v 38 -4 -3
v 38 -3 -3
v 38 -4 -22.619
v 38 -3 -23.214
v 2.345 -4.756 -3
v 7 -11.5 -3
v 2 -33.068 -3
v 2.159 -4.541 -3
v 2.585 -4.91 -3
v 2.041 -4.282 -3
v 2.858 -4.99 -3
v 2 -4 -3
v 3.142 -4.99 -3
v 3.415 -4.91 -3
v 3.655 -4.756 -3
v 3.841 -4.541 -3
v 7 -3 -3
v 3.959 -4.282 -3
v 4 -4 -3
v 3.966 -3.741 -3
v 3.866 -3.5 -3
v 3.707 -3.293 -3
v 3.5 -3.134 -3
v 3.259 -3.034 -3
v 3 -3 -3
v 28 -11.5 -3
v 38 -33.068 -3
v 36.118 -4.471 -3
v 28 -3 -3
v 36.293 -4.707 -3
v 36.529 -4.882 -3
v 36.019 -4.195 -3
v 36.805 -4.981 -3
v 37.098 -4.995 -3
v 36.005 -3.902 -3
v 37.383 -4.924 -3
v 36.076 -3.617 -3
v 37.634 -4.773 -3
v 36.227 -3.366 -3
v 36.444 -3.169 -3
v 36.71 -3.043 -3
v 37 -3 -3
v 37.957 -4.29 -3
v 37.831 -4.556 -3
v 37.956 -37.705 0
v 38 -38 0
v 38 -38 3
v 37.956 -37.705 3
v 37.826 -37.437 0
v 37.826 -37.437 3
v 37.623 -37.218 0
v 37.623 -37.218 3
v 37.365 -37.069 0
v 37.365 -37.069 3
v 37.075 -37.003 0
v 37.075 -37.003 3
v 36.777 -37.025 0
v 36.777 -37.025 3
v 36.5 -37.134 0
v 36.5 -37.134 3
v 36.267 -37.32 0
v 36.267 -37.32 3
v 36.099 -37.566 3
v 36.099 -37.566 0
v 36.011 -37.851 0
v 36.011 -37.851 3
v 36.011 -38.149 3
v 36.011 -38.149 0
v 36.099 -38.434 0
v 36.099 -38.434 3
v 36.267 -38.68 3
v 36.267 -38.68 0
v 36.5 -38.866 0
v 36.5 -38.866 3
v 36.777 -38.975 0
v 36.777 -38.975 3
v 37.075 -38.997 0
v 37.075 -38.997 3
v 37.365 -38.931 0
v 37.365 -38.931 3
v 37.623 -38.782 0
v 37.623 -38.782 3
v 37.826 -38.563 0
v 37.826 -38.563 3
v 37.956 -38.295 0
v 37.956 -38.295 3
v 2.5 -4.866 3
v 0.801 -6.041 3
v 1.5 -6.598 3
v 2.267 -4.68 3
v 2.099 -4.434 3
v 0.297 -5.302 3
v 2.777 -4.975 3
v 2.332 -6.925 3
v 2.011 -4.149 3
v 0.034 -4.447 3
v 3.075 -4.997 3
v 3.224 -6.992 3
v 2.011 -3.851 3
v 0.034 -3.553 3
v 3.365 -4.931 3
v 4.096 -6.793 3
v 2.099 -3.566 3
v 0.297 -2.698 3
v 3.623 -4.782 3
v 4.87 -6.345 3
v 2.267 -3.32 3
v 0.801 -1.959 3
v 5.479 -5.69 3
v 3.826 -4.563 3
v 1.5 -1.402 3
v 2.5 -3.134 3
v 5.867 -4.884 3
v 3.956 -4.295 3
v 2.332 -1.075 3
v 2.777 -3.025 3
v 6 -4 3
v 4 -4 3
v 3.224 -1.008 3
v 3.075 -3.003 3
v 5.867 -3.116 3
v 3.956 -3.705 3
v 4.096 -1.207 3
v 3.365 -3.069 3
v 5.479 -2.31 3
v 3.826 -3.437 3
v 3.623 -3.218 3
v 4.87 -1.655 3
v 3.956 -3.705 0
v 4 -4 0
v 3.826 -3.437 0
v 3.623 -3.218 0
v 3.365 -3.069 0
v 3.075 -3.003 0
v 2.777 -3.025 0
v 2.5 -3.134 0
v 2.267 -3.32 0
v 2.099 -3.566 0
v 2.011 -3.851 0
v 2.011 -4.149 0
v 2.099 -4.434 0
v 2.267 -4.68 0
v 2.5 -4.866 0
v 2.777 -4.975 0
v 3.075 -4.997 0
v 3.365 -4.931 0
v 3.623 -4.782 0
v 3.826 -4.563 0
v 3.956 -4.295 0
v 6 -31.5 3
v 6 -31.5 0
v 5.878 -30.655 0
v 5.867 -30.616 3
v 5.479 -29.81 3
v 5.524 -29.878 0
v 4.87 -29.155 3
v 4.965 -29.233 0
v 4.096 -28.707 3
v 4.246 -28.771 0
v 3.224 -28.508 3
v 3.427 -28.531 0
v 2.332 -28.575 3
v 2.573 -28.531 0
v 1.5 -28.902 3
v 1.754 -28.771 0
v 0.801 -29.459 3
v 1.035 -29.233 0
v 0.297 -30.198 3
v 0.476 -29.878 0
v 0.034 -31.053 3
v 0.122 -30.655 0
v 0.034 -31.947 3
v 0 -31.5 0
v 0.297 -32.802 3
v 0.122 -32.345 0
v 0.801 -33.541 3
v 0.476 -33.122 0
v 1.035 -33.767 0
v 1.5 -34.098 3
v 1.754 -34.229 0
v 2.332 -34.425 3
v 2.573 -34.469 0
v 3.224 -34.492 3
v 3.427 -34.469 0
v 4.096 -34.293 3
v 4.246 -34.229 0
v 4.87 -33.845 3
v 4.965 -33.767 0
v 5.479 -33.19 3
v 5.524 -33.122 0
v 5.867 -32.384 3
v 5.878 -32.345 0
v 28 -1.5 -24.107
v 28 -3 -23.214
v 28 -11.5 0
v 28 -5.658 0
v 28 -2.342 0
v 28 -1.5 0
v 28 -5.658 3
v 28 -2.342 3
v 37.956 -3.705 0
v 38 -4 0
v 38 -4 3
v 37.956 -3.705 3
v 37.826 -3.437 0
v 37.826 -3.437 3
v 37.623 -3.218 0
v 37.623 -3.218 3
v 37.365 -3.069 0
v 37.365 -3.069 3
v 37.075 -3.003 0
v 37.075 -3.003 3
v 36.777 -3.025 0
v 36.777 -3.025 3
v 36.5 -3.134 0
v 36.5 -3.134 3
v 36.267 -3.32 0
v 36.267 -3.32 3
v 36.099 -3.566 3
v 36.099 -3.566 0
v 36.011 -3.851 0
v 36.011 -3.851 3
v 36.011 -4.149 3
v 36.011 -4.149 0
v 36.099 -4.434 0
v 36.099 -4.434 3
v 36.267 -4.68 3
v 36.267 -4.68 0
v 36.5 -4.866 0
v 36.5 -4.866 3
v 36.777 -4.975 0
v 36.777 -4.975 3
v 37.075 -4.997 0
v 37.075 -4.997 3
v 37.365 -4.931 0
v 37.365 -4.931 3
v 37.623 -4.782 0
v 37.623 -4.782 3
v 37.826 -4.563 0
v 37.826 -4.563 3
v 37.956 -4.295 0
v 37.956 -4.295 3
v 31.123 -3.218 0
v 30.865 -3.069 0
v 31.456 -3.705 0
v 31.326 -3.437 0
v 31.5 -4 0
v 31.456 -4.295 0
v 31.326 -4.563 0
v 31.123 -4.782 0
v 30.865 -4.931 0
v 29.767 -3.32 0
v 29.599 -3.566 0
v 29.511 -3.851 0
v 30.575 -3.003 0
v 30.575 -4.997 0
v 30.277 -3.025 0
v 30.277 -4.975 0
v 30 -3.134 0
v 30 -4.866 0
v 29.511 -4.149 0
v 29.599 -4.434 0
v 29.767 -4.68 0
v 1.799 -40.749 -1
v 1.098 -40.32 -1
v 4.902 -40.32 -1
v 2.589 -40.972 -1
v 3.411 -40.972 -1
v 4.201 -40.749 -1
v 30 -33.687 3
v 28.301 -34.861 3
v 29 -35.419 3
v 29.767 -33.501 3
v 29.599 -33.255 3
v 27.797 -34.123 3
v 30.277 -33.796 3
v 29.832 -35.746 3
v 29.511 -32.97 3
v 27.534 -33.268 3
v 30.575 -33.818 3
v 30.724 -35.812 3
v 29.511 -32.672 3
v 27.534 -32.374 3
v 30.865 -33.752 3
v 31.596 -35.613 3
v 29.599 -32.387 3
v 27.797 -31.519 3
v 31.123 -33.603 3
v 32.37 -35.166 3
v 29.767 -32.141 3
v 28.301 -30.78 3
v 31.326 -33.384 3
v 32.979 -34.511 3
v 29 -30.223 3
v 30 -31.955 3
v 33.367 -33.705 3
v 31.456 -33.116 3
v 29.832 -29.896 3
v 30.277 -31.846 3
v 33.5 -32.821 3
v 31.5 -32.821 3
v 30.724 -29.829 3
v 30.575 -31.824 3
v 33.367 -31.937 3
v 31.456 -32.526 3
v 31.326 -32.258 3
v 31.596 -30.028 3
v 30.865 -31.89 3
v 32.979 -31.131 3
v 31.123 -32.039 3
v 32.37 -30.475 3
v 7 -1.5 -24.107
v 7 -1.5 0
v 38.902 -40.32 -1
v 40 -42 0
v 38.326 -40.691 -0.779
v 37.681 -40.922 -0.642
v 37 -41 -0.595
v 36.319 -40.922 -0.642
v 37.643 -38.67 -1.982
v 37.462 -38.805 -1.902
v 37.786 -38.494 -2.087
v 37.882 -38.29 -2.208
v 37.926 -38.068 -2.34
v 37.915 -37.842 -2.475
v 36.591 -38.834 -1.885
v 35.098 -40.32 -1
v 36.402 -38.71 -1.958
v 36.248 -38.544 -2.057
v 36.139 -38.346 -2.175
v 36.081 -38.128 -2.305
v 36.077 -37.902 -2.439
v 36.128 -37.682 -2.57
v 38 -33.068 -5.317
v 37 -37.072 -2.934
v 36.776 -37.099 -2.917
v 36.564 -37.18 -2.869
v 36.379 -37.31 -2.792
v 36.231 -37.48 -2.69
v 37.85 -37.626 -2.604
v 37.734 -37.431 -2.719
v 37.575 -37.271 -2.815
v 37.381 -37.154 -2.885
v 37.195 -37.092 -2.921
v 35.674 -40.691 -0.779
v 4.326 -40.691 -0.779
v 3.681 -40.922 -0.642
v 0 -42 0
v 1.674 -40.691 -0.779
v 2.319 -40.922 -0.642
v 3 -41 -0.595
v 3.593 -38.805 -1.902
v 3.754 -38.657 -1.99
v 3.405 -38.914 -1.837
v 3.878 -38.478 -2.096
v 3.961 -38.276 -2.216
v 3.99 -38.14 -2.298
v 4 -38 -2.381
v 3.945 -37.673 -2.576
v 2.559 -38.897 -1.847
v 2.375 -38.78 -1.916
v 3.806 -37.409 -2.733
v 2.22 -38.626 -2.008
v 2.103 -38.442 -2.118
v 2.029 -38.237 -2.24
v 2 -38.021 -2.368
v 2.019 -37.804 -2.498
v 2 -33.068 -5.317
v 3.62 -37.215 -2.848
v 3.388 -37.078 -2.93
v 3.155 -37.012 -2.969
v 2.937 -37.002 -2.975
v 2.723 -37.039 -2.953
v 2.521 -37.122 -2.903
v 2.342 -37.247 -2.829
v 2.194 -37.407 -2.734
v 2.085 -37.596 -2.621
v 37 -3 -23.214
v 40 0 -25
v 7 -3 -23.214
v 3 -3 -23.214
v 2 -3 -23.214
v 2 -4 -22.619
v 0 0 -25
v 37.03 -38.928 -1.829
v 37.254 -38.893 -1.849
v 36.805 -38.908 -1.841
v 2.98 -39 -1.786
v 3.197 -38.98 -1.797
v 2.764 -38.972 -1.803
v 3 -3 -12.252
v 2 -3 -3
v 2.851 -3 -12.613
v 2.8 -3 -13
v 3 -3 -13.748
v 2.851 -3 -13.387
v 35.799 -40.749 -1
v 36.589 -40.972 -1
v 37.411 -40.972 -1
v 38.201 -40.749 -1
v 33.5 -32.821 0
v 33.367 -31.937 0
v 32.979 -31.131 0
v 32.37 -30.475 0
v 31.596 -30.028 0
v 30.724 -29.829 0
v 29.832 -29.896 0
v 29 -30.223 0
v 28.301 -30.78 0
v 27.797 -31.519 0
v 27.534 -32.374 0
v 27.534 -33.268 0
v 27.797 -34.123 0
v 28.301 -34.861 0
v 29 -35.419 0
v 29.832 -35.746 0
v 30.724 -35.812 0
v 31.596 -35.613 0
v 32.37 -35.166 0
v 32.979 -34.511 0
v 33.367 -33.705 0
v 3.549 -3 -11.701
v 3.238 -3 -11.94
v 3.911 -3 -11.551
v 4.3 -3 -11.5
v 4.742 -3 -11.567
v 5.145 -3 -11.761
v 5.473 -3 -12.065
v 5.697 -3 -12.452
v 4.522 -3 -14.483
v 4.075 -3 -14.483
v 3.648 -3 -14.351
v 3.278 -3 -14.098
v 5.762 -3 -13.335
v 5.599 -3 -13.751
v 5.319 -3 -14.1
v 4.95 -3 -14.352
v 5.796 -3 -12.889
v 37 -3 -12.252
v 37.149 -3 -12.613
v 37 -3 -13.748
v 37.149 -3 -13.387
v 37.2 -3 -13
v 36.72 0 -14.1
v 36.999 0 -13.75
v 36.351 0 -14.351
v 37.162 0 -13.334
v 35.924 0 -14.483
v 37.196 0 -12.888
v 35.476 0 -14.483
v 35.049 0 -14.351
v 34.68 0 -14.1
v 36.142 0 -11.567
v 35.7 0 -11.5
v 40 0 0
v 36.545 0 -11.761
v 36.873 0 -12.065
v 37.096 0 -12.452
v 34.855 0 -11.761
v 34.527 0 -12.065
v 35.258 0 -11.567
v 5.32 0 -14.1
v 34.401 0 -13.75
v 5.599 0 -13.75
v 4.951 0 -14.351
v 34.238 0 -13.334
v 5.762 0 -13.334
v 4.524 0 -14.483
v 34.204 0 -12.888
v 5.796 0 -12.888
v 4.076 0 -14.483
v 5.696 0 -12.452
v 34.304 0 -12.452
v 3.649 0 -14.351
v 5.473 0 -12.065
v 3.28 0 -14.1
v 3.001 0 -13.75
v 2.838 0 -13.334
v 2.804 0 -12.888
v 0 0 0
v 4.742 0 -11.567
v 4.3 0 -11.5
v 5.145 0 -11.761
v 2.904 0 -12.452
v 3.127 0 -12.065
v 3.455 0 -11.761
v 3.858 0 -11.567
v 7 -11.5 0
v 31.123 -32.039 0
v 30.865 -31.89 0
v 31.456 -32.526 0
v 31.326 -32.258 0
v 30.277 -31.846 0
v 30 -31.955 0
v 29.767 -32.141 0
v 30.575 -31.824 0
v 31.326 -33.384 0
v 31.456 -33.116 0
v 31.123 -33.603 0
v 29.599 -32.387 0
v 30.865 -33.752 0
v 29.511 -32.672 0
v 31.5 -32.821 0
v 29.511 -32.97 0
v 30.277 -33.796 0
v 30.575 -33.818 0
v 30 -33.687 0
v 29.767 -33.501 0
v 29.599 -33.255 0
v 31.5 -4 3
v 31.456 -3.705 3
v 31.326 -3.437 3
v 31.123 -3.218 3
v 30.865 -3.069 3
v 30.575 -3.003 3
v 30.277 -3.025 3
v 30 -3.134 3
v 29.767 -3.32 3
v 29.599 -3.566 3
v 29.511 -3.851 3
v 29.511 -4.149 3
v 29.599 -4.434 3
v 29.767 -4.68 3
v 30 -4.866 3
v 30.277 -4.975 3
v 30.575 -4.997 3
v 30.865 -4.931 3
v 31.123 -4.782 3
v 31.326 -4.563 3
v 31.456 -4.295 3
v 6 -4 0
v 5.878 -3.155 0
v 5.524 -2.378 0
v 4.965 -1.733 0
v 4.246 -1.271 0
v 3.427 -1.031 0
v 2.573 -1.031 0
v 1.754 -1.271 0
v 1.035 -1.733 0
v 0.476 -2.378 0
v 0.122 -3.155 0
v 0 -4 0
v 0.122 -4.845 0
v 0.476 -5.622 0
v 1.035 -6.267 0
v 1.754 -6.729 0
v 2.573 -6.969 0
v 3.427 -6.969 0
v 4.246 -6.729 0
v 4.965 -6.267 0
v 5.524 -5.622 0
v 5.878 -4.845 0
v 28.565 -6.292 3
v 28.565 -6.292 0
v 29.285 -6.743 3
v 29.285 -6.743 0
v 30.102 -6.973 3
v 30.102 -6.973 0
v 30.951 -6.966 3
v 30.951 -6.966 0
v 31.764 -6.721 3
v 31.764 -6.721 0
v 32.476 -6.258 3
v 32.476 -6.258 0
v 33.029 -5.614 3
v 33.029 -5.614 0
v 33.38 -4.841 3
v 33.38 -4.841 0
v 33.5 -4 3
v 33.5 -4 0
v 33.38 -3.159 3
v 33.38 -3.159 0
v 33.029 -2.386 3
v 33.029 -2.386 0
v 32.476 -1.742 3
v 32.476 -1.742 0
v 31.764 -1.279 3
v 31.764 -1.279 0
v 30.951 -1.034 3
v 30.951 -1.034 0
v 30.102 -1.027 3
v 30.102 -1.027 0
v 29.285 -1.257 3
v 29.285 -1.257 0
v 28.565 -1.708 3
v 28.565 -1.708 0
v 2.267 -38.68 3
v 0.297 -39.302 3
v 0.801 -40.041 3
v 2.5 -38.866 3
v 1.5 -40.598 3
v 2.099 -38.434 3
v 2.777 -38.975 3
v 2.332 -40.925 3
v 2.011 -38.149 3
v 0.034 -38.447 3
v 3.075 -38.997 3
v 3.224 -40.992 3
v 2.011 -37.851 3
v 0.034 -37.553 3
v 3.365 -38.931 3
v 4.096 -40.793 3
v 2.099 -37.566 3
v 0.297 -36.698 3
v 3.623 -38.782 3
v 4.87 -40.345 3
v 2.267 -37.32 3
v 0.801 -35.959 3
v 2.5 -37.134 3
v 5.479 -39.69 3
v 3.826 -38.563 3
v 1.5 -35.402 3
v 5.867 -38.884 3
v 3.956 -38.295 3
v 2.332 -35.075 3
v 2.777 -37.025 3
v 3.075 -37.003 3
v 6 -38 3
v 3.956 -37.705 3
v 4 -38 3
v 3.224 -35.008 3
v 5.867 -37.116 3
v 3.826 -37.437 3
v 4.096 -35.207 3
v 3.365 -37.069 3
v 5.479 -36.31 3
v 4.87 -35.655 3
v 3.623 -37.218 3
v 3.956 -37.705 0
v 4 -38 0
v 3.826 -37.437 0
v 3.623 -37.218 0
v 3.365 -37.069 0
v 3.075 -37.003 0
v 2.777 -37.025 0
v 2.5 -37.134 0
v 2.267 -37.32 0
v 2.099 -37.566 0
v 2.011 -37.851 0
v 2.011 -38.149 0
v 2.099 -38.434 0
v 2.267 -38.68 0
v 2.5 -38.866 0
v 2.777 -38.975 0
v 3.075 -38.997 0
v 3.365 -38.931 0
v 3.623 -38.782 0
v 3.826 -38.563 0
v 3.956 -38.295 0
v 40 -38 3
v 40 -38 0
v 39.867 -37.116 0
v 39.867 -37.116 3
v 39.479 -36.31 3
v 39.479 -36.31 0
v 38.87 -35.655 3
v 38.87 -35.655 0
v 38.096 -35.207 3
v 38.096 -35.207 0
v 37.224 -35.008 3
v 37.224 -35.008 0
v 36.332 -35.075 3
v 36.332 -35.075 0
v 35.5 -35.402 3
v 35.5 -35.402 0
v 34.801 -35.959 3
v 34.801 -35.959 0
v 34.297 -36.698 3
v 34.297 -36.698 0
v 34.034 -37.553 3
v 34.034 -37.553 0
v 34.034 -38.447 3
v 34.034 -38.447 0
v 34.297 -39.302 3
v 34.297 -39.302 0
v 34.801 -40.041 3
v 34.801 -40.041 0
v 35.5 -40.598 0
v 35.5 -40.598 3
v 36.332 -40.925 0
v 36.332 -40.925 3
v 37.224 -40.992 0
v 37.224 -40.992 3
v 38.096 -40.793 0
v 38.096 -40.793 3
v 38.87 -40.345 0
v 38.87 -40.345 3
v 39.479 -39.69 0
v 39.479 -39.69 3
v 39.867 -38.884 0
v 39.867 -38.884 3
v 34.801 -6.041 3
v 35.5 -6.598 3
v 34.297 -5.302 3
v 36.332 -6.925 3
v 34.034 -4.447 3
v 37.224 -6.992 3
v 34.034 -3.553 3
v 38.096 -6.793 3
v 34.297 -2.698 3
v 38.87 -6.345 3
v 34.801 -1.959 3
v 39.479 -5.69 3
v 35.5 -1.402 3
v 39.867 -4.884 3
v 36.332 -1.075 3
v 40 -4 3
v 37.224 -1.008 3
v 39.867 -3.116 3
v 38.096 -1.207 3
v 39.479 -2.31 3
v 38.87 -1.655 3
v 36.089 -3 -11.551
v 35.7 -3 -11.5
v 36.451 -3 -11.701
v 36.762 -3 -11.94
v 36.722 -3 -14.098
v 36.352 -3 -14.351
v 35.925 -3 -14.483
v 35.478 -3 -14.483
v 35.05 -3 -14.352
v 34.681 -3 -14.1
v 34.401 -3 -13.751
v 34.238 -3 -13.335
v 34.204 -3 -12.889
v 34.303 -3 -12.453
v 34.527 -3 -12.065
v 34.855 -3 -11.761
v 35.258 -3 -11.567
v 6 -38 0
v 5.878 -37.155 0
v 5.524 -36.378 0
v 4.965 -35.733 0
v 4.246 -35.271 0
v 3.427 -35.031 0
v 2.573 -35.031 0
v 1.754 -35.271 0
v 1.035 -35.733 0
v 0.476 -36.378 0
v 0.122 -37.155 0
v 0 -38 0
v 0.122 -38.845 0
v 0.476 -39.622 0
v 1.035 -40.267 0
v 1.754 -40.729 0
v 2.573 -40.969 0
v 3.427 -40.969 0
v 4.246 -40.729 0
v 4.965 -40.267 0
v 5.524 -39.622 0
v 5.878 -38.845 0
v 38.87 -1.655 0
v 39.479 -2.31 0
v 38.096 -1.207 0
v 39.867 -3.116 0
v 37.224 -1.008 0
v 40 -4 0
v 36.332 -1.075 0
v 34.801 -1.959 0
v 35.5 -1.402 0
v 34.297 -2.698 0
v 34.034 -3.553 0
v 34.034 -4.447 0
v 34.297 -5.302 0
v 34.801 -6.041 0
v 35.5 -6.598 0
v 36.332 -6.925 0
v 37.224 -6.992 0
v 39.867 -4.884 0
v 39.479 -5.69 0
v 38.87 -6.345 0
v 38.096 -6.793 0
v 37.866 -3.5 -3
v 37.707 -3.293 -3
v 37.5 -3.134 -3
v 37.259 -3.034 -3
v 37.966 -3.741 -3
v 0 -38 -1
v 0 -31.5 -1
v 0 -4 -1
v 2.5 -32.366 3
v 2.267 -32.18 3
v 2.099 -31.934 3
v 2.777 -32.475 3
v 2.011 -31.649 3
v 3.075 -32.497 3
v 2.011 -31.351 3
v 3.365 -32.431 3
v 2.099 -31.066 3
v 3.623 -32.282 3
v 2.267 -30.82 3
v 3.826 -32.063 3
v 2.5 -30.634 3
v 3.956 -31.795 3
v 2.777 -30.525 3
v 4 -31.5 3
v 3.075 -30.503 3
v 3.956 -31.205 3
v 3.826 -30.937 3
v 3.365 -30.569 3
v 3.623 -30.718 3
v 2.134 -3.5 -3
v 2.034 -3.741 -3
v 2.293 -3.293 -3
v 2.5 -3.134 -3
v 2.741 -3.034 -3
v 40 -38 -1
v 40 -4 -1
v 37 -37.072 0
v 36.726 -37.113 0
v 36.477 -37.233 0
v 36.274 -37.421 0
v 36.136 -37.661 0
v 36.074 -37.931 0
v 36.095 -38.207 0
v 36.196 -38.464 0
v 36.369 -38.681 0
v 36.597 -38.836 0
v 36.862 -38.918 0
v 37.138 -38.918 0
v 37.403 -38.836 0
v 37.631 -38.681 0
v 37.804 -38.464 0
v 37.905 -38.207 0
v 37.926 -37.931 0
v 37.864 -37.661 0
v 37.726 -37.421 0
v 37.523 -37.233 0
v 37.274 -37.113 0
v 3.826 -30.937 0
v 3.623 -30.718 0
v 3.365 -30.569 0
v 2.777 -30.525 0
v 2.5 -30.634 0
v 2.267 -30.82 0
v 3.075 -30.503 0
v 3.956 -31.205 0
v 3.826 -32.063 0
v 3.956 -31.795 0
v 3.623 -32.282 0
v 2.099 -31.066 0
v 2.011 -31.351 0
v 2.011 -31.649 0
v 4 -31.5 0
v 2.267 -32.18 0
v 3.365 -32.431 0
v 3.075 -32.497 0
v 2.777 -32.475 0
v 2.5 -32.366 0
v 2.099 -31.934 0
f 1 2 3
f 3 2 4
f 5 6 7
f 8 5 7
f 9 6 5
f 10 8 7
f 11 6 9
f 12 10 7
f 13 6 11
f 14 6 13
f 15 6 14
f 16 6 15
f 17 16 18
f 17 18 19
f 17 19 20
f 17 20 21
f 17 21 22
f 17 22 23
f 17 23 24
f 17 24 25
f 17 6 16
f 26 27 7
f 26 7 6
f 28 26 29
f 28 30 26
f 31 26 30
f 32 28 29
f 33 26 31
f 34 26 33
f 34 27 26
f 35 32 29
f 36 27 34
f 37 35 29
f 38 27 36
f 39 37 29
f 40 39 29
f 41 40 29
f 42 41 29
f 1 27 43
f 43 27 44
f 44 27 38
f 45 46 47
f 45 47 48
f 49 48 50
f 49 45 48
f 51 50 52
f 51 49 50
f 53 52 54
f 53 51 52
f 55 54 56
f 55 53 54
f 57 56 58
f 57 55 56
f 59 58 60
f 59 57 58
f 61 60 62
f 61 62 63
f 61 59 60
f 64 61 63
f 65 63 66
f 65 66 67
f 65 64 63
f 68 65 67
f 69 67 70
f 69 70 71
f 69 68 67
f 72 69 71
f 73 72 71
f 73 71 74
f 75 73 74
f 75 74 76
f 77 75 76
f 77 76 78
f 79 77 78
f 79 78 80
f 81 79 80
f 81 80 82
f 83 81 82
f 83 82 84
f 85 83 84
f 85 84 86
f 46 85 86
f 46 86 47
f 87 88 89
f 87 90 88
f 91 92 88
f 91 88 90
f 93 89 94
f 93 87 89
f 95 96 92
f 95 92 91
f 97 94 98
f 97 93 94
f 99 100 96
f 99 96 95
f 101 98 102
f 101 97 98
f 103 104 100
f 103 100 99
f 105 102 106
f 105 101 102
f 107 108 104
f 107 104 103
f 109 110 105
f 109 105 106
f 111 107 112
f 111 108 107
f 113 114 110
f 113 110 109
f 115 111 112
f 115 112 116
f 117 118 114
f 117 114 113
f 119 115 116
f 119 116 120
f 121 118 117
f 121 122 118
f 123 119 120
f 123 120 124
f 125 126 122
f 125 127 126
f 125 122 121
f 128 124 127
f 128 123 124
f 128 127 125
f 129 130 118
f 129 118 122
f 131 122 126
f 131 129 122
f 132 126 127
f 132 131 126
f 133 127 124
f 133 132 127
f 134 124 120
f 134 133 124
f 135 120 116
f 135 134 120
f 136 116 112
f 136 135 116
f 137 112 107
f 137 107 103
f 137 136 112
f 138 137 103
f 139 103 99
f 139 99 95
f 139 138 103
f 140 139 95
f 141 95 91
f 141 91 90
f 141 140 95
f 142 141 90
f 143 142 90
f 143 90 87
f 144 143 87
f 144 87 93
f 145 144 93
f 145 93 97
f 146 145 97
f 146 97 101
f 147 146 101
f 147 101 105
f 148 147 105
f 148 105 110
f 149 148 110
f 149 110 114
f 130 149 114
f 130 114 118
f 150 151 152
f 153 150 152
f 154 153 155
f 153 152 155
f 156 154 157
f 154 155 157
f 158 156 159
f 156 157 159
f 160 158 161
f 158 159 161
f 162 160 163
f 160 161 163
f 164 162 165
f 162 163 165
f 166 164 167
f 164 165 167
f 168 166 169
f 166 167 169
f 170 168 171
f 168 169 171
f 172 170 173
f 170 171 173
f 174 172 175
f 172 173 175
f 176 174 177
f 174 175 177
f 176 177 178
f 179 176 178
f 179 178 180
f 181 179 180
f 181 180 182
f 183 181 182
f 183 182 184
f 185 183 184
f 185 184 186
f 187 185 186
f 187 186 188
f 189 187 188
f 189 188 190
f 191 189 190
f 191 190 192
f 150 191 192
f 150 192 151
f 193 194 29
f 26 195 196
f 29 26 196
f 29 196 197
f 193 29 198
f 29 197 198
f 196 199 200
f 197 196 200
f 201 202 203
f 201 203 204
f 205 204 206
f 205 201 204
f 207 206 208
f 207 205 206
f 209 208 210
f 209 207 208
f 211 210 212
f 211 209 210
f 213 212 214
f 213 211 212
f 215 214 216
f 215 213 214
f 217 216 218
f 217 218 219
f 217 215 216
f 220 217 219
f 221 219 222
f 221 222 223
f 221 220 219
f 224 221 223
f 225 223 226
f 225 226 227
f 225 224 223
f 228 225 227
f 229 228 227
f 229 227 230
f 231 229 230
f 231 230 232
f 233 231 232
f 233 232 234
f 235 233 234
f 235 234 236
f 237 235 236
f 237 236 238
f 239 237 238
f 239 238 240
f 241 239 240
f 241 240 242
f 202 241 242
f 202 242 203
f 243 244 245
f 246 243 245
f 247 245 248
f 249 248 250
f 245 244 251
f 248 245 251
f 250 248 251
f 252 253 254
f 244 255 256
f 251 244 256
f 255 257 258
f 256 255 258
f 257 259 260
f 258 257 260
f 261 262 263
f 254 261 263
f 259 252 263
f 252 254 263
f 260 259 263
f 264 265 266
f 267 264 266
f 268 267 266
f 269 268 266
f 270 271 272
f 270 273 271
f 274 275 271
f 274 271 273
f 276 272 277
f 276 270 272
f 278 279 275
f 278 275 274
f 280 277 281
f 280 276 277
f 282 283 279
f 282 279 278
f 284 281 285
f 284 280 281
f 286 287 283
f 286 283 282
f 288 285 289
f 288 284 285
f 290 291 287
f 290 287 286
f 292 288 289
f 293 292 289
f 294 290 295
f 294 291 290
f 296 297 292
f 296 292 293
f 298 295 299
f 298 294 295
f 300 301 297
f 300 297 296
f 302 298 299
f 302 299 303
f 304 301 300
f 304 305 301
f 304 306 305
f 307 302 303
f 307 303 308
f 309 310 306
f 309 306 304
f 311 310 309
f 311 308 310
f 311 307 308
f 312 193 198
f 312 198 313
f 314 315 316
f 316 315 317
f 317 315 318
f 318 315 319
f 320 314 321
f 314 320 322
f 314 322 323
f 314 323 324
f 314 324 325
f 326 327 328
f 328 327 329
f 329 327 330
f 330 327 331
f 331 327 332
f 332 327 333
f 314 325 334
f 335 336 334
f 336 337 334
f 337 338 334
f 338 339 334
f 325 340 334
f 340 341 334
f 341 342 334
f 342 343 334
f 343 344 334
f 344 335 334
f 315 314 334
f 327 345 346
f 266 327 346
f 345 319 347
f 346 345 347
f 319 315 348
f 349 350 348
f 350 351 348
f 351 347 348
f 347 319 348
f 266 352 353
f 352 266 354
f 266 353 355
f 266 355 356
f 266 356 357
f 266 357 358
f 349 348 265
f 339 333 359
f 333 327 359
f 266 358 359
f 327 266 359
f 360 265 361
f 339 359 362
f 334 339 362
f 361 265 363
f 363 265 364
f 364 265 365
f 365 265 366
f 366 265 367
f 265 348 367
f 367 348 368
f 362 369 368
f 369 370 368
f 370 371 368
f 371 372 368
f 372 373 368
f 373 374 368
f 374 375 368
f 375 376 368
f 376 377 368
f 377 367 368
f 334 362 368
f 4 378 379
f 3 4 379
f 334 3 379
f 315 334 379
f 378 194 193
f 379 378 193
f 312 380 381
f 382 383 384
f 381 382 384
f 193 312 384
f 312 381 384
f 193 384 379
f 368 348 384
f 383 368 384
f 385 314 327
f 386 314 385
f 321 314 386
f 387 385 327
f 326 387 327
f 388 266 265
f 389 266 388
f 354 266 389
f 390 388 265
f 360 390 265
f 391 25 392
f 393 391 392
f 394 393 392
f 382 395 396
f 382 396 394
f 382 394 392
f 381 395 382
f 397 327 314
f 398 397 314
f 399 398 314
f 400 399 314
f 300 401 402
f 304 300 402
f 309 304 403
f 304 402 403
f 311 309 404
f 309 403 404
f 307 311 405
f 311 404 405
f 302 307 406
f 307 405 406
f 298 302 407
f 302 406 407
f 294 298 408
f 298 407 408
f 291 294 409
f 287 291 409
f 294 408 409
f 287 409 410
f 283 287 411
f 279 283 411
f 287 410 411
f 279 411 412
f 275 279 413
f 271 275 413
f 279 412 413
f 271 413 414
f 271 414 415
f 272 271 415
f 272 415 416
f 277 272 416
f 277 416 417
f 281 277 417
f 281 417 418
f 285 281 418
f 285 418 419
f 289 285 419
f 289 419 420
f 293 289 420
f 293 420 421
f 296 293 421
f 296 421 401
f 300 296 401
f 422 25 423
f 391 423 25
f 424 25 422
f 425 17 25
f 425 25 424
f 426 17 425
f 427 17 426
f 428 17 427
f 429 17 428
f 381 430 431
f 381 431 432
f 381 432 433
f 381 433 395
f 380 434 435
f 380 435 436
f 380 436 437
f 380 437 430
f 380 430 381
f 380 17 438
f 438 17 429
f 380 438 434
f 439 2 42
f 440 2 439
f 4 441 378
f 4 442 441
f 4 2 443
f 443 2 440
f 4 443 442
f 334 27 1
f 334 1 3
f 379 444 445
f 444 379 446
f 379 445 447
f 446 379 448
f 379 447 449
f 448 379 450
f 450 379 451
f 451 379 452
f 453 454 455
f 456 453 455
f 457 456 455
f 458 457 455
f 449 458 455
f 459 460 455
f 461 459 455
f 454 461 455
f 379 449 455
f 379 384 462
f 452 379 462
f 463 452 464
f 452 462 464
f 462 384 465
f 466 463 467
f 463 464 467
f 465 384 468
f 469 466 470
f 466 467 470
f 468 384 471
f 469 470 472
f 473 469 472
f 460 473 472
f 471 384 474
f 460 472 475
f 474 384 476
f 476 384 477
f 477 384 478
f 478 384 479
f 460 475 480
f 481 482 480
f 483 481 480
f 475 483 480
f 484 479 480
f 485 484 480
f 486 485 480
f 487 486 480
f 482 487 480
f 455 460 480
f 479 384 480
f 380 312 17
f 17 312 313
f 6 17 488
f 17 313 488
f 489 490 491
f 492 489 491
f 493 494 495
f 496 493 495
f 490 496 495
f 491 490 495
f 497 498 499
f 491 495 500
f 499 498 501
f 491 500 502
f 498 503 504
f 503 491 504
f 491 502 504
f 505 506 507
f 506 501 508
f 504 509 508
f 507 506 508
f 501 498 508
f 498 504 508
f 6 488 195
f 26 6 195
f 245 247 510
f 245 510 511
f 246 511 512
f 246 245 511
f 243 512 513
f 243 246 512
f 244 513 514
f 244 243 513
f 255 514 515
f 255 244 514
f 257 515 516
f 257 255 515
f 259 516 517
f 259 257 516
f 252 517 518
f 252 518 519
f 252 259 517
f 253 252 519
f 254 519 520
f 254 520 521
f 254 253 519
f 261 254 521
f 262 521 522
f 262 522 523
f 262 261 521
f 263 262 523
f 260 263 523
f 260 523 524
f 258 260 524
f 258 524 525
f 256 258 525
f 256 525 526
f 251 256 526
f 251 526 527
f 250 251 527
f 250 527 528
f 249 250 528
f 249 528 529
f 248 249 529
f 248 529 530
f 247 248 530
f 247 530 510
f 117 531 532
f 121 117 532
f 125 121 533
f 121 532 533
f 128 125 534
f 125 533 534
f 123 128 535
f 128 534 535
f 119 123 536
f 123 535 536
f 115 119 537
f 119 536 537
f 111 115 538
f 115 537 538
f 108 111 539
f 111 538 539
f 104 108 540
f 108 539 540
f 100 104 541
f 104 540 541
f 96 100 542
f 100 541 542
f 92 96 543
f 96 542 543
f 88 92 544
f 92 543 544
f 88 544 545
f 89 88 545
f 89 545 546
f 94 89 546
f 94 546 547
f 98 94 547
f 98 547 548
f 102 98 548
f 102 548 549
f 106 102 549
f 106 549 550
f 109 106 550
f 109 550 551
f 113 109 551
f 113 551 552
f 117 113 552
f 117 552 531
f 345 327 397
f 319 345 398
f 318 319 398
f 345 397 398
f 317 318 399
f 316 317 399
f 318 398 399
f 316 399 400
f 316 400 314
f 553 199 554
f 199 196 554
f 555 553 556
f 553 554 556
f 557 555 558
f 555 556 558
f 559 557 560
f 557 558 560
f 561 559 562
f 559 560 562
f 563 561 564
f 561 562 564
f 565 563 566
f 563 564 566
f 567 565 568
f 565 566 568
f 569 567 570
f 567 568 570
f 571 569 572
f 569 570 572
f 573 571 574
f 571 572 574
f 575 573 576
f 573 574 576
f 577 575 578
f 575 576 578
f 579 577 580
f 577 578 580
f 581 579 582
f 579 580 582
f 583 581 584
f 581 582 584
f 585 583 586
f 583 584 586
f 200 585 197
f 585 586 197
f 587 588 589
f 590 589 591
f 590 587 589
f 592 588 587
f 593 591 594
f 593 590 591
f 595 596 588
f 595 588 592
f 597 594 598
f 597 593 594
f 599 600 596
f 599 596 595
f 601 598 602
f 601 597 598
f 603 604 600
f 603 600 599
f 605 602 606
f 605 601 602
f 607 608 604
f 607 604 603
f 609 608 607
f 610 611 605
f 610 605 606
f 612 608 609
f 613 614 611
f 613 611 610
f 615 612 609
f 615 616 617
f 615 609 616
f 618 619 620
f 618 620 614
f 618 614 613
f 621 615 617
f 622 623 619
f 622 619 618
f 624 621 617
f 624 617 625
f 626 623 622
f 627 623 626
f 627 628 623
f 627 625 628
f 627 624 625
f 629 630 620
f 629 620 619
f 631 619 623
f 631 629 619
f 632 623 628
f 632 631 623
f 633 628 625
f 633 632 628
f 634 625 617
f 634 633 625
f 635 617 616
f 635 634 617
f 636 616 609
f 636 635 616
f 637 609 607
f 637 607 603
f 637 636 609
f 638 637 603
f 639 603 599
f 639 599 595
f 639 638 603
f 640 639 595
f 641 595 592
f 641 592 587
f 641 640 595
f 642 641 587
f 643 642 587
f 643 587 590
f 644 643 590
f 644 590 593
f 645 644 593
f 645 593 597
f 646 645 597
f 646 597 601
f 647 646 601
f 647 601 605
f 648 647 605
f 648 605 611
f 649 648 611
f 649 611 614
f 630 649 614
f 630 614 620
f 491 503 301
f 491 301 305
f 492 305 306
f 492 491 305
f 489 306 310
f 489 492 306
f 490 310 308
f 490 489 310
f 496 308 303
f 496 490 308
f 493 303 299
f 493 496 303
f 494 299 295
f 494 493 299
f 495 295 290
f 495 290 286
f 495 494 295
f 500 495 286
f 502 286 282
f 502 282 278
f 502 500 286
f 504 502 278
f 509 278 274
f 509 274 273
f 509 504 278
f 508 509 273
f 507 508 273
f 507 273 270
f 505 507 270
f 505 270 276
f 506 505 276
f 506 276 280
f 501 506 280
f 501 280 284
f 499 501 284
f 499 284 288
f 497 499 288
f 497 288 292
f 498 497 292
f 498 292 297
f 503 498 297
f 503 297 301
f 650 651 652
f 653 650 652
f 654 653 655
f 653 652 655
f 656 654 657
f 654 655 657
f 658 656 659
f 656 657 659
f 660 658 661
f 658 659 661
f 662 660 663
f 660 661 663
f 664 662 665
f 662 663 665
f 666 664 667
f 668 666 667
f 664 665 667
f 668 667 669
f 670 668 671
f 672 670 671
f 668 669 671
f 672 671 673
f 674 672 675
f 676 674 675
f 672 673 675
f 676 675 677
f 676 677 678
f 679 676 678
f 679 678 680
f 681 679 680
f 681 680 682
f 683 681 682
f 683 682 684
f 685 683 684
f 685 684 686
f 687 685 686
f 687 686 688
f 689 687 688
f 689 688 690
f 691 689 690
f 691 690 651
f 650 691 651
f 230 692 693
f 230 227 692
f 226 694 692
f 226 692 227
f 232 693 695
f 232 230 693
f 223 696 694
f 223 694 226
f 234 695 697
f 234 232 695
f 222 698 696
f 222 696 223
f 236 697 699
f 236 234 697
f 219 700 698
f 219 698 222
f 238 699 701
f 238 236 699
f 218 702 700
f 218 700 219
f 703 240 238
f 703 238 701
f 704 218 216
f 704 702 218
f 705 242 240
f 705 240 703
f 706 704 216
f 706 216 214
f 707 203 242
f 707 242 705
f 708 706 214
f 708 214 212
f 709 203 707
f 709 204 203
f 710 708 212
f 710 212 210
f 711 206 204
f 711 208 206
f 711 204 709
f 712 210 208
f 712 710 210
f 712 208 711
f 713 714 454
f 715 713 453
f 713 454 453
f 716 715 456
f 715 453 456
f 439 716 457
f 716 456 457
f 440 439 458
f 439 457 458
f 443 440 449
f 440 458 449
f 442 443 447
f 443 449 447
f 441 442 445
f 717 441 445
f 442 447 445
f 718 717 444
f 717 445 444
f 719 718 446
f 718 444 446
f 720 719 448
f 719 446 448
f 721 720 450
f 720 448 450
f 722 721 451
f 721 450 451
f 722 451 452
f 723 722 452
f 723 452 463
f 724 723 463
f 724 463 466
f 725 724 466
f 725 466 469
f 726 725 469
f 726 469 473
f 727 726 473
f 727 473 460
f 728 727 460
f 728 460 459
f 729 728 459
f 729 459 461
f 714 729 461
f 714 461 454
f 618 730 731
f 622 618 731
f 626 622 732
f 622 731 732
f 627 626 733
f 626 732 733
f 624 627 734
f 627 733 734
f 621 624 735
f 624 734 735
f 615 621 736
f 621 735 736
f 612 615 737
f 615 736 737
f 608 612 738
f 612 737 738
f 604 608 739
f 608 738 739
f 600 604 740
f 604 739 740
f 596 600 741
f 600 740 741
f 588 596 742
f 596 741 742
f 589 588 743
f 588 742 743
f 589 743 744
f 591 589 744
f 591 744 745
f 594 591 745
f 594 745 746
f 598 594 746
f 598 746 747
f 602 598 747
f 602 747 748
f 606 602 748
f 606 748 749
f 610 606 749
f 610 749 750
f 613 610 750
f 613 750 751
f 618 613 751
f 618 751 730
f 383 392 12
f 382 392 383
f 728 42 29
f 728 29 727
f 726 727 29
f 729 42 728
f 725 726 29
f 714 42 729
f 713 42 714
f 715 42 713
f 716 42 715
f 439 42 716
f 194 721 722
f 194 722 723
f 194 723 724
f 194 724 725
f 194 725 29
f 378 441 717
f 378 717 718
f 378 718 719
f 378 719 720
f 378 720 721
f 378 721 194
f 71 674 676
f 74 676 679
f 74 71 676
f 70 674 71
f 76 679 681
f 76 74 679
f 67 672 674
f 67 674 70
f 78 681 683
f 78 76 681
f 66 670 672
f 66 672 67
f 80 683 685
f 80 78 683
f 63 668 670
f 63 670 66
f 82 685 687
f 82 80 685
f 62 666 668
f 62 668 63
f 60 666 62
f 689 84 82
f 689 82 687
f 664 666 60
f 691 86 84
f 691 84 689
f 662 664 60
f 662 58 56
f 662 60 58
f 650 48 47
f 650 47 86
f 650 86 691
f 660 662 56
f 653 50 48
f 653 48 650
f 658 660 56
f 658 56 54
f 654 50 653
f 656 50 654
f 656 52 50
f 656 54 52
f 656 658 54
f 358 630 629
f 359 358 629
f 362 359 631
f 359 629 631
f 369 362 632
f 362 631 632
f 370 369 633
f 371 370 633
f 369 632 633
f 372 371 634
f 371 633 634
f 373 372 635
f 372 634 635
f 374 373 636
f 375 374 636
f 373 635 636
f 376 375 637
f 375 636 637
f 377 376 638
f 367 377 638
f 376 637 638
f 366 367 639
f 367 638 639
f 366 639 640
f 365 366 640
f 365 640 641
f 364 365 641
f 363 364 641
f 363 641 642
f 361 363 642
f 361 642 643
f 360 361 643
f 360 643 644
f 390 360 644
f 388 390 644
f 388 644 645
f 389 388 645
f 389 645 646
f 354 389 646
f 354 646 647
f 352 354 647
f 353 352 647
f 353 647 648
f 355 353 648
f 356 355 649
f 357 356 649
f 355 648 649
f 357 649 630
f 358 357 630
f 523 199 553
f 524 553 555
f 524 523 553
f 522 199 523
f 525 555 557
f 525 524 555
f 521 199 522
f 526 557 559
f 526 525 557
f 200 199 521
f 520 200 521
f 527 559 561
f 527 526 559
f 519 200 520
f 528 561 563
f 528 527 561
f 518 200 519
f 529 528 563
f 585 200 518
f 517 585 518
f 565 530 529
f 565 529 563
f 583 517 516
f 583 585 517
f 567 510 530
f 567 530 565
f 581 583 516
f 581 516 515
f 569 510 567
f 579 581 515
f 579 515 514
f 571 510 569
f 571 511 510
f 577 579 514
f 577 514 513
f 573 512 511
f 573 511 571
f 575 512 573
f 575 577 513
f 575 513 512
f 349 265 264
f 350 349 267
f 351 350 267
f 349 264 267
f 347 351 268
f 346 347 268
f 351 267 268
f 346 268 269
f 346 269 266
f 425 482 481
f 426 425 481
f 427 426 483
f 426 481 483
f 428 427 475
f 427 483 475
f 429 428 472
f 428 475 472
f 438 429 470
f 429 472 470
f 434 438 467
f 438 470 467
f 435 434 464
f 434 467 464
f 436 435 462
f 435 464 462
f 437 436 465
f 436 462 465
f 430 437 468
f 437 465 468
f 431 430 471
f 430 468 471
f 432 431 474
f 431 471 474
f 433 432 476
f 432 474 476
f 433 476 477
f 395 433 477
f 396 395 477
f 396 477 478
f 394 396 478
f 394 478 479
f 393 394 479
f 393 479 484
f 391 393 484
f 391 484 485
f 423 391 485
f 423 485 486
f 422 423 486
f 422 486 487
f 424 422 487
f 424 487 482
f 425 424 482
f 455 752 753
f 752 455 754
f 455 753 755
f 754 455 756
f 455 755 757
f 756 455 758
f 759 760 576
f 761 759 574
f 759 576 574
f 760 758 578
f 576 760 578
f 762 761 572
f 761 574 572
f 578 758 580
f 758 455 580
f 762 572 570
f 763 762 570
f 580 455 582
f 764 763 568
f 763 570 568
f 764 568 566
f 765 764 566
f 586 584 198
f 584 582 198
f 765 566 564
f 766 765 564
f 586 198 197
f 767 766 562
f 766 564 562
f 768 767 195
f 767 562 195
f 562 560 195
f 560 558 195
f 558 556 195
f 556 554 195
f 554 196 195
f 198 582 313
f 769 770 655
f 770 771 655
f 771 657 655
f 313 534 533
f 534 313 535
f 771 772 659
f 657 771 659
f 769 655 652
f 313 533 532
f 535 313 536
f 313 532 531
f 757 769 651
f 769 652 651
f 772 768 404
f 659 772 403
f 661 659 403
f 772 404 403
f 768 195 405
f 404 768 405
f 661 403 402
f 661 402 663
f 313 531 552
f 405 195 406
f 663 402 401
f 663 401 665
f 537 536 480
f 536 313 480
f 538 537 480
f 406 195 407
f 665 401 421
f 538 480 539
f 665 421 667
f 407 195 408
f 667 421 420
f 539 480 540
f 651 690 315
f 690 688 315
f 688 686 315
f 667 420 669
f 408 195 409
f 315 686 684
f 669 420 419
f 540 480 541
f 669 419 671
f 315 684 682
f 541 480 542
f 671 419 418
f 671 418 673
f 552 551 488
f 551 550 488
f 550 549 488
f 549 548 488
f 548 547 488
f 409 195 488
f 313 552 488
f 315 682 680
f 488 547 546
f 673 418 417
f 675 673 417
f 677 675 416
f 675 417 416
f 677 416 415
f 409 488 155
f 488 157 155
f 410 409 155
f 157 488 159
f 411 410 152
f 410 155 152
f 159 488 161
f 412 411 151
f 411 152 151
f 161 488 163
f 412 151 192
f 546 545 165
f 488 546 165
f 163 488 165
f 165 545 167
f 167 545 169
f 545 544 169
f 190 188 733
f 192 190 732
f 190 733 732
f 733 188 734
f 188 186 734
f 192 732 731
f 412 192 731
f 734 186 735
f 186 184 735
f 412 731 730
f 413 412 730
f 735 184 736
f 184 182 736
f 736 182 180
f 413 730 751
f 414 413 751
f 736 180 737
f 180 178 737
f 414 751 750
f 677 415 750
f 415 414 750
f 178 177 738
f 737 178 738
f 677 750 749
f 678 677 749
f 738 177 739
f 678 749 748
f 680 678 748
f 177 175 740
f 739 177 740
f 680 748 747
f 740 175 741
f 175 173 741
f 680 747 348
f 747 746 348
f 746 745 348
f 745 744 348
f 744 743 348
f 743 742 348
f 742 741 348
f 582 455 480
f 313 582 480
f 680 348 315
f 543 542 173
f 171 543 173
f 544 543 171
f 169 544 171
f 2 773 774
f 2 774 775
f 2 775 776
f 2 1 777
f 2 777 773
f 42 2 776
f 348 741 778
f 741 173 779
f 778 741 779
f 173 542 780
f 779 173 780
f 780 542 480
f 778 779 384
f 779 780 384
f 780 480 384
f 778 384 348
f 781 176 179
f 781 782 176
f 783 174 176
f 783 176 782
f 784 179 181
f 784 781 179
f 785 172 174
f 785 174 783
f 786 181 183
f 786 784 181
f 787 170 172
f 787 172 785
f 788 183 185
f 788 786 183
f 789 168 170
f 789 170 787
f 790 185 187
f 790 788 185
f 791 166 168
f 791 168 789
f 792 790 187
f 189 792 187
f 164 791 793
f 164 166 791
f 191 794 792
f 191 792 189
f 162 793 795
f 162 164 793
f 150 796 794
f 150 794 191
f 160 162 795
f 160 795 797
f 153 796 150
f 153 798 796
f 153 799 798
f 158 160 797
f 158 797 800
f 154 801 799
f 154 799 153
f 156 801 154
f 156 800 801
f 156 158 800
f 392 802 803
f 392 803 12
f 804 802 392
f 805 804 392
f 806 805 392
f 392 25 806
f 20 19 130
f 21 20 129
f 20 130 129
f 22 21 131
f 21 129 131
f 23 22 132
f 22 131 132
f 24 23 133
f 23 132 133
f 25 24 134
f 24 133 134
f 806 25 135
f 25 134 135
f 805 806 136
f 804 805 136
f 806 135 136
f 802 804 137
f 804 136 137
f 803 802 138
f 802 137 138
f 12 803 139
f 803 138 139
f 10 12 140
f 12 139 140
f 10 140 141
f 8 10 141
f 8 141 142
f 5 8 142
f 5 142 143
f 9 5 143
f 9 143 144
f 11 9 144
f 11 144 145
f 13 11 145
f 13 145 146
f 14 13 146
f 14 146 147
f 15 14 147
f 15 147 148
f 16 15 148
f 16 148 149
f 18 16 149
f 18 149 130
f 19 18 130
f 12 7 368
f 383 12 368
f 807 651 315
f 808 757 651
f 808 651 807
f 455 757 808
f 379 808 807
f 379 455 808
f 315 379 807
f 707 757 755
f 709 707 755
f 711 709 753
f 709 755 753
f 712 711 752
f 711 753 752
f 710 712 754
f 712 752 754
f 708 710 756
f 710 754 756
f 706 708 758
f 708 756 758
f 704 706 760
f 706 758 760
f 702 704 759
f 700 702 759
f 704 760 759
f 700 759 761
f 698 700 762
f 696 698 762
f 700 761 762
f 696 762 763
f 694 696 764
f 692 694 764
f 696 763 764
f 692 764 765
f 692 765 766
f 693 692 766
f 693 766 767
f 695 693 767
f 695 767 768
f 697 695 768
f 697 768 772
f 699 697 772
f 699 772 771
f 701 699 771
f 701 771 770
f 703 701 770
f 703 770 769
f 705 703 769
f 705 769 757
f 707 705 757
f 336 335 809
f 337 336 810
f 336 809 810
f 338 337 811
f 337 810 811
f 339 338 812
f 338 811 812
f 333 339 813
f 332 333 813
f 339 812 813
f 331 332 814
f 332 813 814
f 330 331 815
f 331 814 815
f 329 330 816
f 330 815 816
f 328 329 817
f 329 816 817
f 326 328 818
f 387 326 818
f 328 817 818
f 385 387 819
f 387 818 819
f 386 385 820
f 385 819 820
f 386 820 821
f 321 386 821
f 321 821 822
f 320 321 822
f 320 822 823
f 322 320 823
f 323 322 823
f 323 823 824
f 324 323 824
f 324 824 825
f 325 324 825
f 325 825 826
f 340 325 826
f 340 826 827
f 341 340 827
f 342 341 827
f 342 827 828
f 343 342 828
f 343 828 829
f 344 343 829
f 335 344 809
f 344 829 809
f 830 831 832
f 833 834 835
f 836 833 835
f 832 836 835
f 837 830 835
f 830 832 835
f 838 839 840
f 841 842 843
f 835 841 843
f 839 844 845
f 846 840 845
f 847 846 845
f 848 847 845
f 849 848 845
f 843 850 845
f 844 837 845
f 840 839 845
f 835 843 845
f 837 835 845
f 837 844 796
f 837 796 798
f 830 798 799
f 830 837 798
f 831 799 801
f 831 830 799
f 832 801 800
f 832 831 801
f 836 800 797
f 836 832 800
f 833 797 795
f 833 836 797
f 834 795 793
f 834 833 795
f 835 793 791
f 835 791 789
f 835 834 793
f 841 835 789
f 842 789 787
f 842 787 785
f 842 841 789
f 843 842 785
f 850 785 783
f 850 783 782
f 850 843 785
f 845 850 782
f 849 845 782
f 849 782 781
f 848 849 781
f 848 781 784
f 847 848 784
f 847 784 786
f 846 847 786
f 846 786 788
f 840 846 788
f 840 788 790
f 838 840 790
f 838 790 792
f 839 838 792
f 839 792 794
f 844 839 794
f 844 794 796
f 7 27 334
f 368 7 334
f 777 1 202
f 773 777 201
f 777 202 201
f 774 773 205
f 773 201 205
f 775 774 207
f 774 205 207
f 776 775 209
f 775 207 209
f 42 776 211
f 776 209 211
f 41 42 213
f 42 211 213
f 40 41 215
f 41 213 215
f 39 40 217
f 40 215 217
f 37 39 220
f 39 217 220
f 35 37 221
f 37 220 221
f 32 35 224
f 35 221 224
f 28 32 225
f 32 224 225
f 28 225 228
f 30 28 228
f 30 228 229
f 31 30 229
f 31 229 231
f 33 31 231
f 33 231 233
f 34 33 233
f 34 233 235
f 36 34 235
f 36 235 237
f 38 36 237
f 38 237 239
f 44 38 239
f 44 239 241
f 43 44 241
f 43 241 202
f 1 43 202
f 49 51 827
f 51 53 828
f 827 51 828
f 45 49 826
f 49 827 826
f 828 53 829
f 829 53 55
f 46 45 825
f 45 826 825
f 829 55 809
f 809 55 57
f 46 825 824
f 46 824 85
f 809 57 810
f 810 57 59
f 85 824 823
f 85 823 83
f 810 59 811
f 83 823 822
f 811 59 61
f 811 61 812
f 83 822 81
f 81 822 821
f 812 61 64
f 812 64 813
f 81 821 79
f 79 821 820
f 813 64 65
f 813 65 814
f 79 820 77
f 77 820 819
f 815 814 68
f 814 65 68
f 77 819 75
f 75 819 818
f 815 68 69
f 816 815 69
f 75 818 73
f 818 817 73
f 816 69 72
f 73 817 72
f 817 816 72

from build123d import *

# Parameters (mm, degrees)
EXTRUDE_1_DEPTH      = 40
SKETCH_2_W           = 20.831357784
SKETCH_2_H           = 30.068143155
CUT_EXTRUDE_1_DEPTH  = 36
SKETCH_3_R           = 1.5
CUT_EXTRUDE_2_DEPTH  = 32
EXTRUDE_2_DEPTH      = 3
EXTRUDE_2_DEPTH_BACK = 1
SKETCH_4_R           = 3
SKETCH_4_R_2         = 1
SKETCH_5_R           = 1
SKETCH_5_R_2         = 0.928338532
CUT_EXTRUDE_3_DEPTH  = 65.404968752


with BuildPart() as part:
    # 草图1 → 凸台-拉伸1 (new body)
    with BuildSketch(Plane(origin=(0, 0, 0), x_dir=(0, 0, -1), z_dir=(1, 0, 0))):
        Polygon((0, 0), (0, -42), (25, 0), align=None)
    extrude(amount=EXTRUDE_1_DEPTH)

    # 草图2 → 切除-拉伸1 (cut)
    with BuildSketch(Plane(origin=(38, 0, 0), x_dir=(0, 0, -1), z_dir=(1, 0, 0))):
        with Locations((13.415678892, -18.034071578)):
            Rectangle(SKETCH_2_W, SKETCH_2_H)
    extrude(amount=-CUT_EXTRUDE_1_DEPTH, mode=Mode.SUBTRACT)

    # 草图3 → 切除-拉伸2 (cut)
    with BuildSketch(Plane(origin=(0, 0, 0), x_dir=(1, 0, 0), z_dir=(0, 1, 0))):
        with Locations(Location((4.3, 13, 0), (0, 0, 270))):
            Circle(SKETCH_3_R)
        with Locations(Location((35.7, 13, 0), (0, 0, 270))):
            Circle(SKETCH_3_R)
    extrude(amount=-CUT_EXTRUDE_2_DEPTH, mode=Mode.SUBTRACT)

    # 草图4 → 凸台-拉伸2 (add, two sides: drawn at the far end of the back side and taken through both)
    # profile 1 of 7: a face of its own
    with BuildSketch(Plane.XY.offset(-EXTRUDE_2_DEPTH_BACK)):
        with Locations((3, -4)):
            Circle(SKETCH_4_R)
        with Locations((3, -4)):
            Circle(SKETCH_4_R_2, mode=Mode.SUBTRACT)
    # profile 2 of 7: a face of its own
    with BuildSketch(Plane.XY.offset(-EXTRUDE_2_DEPTH_BACK)):
        with Locations((37, -4)):
            Circle(SKETCH_4_R)
        with Locations((37, -4)):
            Circle(SKETCH_4_R_2, mode=Mode.SUBTRACT)
    # profile 3 of 7: a face of its own
    with BuildSketch(Plane.XY.offset(-EXTRUDE_2_DEPTH_BACK)):
        with Locations((37, -38)):
            Circle(SKETCH_4_R)
        with Locations((37, -38)):
            Circle(SKETCH_4_R_2, mode=Mode.SUBTRACT)
    # profile 4 of 7: a face of its own
    with BuildSketch(Plane.XY.offset(-EXTRUDE_2_DEPTH_BACK)):
        with Locations((3, -38)):
            Circle(SKETCH_4_R)
        with Locations((3, -38)):
            Circle(SKETCH_4_R_2, mode=Mode.SUBTRACT)
    # profile 5 of 7: a face of its own
    with BuildSketch(Plane.XY.offset(-EXTRUDE_2_DEPTH_BACK)):
        with Locations((30.5, -4)):
            Circle(SKETCH_4_R)
        with Locations((30.5, -4)):
            Circle(SKETCH_4_R_2, mode=Mode.SUBTRACT)
    # profile 6 of 7: a face of its own
    with BuildSketch(Plane.XY.offset(-EXTRUDE_2_DEPTH_BACK)):
        with Locations((30.5, -32.820866307)):
            Circle(SKETCH_4_R)
        with Locations((30.5, -32.820866307)):
            Circle(SKETCH_4_R_2, mode=Mode.SUBTRACT)
    # profile 7 of 7: a face of its own
    with BuildSketch(Plane.XY.offset(-EXTRUDE_2_DEPTH_BACK)):
        with Locations((3, -31.5)):
            Circle(SKETCH_4_R)
        with Locations((3, -31.5)):
            Circle(SKETCH_4_R_2, mode=Mode.SUBTRACT)
    extrude(amount=EXTRUDE_2_DEPTH + EXTRUDE_2_DEPTH_BACK)

    # 草图5 → 切除-拉伸3 (cut, through all)
    with BuildSketch(Plane.XY.offset(3)):
        with Locations((3, -4)):
            Circle(SKETCH_5_R)
        with Locations((37, -4)):
            Circle(SKETCH_5_R)
        with Locations(Location((37, -38, 0), (0, 0, 90))):
            Circle(SKETCH_5_R_2)
        with Locations((3, -38)):
            Circle(SKETCH_5_R)
        Polygon((20, -1.5), (7, -1.5), (7, -11.5), (20, -11.5), (28, -11.5), (28, -1.5), align=None)
    extrude(amount=-CUT_EXTRUDE_3_DEPTH, mode=Mode.SUBTRACT)


solid = part.part
